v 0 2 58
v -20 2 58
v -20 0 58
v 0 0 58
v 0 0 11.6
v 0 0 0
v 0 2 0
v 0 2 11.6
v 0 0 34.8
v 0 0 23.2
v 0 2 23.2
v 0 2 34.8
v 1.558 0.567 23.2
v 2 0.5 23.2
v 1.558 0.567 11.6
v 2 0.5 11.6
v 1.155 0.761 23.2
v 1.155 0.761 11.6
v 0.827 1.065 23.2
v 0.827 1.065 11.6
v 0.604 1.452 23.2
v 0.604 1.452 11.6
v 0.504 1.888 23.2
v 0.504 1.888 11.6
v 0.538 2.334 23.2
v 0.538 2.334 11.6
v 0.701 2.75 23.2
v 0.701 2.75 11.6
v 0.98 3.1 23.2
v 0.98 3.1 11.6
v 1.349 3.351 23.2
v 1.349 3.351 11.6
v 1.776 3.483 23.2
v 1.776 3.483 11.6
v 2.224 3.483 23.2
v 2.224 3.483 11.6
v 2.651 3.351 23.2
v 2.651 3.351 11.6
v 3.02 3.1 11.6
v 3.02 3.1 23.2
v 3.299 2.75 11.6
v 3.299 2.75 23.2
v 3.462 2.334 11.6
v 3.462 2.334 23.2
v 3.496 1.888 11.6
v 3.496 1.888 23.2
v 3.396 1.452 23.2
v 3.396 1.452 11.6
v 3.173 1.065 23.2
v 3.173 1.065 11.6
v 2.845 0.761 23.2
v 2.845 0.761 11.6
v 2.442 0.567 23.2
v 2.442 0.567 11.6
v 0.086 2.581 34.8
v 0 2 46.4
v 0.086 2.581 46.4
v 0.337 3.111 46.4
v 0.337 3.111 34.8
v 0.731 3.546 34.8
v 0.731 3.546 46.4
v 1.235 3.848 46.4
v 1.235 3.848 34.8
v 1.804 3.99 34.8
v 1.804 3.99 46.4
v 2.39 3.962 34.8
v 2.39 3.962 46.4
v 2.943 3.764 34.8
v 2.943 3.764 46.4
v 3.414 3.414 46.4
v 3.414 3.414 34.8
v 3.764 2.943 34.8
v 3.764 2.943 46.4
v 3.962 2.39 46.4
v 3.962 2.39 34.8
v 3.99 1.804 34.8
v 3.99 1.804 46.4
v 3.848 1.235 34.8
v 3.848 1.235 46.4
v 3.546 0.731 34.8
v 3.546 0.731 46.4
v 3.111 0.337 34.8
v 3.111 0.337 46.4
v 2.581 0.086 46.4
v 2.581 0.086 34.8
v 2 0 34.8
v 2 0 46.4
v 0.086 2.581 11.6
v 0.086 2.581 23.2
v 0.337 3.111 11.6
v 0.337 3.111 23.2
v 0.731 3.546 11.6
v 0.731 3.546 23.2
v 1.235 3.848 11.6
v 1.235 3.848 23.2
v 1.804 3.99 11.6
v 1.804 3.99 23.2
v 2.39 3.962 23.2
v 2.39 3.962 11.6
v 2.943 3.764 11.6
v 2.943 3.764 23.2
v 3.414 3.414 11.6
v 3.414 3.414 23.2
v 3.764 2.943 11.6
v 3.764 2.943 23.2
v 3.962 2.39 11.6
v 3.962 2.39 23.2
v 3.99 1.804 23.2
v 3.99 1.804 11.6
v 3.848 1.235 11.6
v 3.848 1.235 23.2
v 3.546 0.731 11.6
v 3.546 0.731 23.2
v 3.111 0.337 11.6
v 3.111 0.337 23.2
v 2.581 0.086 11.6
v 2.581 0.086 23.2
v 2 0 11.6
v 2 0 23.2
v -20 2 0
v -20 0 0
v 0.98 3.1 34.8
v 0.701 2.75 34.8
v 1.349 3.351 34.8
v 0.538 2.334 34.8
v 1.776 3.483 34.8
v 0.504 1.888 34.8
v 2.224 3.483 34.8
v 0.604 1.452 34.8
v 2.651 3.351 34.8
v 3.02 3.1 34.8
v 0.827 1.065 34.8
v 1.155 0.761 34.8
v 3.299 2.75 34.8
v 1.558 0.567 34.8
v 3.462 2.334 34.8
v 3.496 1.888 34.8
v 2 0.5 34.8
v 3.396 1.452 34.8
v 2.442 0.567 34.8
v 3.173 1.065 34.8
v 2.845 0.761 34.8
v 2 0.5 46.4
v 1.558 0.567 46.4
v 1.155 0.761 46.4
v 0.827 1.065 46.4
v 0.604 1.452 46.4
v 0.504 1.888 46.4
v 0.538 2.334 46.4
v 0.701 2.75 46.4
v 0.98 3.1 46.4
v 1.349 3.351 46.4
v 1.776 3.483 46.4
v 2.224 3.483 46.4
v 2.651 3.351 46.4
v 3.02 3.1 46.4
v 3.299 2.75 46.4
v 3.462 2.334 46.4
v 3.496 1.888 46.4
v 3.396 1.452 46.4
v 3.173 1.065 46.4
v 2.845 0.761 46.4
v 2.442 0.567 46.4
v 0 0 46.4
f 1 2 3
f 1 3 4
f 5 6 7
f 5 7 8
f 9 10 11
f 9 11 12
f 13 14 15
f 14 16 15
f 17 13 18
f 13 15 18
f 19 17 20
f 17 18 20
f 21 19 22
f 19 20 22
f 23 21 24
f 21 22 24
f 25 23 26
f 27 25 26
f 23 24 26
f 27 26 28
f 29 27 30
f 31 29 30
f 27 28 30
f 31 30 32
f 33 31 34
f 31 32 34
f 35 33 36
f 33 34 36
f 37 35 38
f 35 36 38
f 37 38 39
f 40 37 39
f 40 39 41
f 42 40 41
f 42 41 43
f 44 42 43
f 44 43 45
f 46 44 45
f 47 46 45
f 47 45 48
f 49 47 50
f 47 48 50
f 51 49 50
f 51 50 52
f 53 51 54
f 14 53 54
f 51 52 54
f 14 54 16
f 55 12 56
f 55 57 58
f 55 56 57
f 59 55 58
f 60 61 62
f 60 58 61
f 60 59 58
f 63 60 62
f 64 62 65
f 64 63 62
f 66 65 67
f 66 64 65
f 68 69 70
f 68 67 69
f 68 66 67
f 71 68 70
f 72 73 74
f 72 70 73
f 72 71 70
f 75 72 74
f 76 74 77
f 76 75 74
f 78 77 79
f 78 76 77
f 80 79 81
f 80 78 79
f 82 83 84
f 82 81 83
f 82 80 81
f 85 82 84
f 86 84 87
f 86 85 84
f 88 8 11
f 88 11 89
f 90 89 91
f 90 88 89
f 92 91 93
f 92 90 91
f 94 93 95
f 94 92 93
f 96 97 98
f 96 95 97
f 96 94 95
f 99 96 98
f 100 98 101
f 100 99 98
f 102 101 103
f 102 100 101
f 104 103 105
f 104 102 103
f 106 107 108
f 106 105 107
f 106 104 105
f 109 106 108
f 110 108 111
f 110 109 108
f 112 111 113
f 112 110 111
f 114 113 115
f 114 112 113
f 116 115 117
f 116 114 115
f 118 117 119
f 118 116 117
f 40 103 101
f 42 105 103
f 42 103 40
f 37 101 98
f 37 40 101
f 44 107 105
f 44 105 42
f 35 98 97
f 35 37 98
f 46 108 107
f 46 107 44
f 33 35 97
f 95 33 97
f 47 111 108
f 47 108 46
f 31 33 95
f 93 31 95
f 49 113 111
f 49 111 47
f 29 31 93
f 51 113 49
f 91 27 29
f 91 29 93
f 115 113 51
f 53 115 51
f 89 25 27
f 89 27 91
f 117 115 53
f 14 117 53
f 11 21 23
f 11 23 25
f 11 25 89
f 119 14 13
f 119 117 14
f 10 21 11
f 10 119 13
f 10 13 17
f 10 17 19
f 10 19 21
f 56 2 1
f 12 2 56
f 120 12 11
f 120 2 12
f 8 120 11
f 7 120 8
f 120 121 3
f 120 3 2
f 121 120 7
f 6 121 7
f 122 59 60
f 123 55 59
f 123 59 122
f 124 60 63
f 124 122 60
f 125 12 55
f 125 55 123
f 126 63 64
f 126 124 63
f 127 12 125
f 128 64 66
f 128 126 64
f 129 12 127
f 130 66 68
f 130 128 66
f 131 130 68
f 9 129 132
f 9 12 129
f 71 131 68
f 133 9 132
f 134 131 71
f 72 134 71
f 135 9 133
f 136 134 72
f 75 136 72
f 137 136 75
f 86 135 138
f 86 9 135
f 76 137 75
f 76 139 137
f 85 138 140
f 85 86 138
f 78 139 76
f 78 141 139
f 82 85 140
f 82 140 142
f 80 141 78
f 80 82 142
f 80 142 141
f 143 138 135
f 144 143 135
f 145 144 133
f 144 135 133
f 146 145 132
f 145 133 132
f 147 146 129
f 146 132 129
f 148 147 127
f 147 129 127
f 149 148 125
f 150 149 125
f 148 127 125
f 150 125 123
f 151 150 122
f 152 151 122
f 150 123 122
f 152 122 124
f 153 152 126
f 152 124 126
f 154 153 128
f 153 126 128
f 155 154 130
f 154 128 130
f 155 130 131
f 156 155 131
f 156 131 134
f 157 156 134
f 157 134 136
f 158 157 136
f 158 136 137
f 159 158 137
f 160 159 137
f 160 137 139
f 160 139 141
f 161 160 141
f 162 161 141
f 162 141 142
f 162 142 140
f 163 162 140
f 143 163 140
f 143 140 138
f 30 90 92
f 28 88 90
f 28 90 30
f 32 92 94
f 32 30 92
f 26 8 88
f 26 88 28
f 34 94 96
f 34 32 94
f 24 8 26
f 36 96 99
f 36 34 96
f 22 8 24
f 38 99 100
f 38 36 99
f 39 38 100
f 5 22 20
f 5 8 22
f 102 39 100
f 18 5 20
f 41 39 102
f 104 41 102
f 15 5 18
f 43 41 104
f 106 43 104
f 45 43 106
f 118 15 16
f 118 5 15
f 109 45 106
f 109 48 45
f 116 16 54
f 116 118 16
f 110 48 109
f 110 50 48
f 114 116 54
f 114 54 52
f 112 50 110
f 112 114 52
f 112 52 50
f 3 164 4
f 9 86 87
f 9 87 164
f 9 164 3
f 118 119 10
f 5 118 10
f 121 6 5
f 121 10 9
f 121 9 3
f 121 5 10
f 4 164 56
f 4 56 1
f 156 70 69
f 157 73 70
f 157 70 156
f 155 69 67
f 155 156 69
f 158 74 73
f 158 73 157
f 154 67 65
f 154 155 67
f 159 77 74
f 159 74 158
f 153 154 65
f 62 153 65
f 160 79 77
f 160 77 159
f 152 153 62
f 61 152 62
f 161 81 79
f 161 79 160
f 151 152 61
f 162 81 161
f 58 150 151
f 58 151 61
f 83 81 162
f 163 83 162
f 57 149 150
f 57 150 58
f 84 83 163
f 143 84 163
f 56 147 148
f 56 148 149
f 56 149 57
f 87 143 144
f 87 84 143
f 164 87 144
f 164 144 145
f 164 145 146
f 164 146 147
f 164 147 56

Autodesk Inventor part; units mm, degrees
ref_plane "YZ Plane" through (0, 0, 0) normal (1, 0, 0) x (0, 1, 0)
ref_plane "XZ Plane" through (0, 0, 0) normal (0, 1, 0) x (-1, 0, 0)
ref_plane "XY Plane" through (0, 0, 0) normal (0, 0, 1) x (1, 0, 0)
sketch "Sketch1" plane through (0, 0, 0) normal (0, 0, 1) x (1, 0, 0)
  line L0 (0, 0) -> (-20, 0)
  line L1 (-20, 0) -> (-20, 2)
  line L2 (-20, 2) -> (0, 2)
  line L3 (0, 2) -> (0, 0)
  line L4 (0, 2) -> (2, 2)
  circle A0 centre (2, 2) radius 2
  line L5 (2, 0) -> (0, 0)
  dimension "d0" = 20
  dimension "d1" = 2
  dimension "d2" = 2
extrude "Extrusion1" add sketch "Sketch1" along normal blind 58
sketch "Sketch2" plane through (-20, 2, 0) normal (0, 1, 0) x (1, 0, 0)
  line L0 (22, 0) -> (20, 0) projected
  line L1 (20, 0) -> (20, -58) projected
  line L2 (22, -58) -> (20, -58) projected
  line L3 (22, 0) -> (22, -58) projected
  line L4 (20, 0) -> (0, 0) projected
  line L5 (0, 0) -> (0, -58) projected
  line L6 (20, -58) -> (0, -58) projected
  line L7 (20, 0) -> (20, -58) projected
  line L8 (20, 0) -> (24, 0) projected
  line L9 (24, 0) -> (20, 0)
  line L10 (20, 0) -> (20, -11.6)
  line L11 (20, -11.6) -> (24, -11.6)
  line L12 (24, -11.6) -> (24, 0)
  line L13 (20, -11.6) -> (24, -11.6)
  line L14 (24, -11.6) -> (24, -23.2)
  line L15 (24, -23.2) -> (20, -23.2)
  line L16 (20, -23.2) -> (20, -11.6)
  line L17 (24, -23.2) -> (20, -23.2)
  line L18 (20, -23.2) -> (20, -34.8)
  line L19 (20, -34.8) -> (24, -34.8)
  line L20 (24, -34.8) -> (24, -23.2)
  line L21 (24, 0) -> (24, -58) projected
  line L22 (20, -34.8) -> (24, -34.8)
  line L23 (24, -34.8) -> (24, -46.4)
  line L24 (24, -46.4) -> (20, -46.4)
  line L25 (20, -46.4) -> (20, -34.8)
  line L26 (24, -46.4) -> (20, -46.4)
  line L27 (20, -46.4) -> (20, -58)
  line L28 (20, -58) -> (24, -58)
  line L29 (24, -58) -> (24, -46.4)
  dimension "d5" = 11.6
  dimension "d6" = 11.6
  dimension "d7" = 11.6
  dimension "d8" = 11.6
extrude "Extrusion2" cut sketch "Sketch2" along normal mid plane 4 contours L3 L11 L1 L0 | L8 L12 L11 L3 | L15 L20 L19 L3 | L3 L19 L1 L15 | L1 L24 L3 L2 | L24 L21 L28 L3
sketch "Sketch3" plane through (0, 0, 58) normal (0, 0, 1) x (1, 0, 0)
  arc A0 (2, 0) -> (0, 2) centre (2, 2) ccw projected
  line L0 (0, 2) -> (0, 0) projected
  line L1 (2, 0) -> (0, 0) projected
hole "Hole1" at (2, 2, 58) direction (0, 0, -1) diameter 3 end through all
properties part number "SchanierTeilB_CPY"
